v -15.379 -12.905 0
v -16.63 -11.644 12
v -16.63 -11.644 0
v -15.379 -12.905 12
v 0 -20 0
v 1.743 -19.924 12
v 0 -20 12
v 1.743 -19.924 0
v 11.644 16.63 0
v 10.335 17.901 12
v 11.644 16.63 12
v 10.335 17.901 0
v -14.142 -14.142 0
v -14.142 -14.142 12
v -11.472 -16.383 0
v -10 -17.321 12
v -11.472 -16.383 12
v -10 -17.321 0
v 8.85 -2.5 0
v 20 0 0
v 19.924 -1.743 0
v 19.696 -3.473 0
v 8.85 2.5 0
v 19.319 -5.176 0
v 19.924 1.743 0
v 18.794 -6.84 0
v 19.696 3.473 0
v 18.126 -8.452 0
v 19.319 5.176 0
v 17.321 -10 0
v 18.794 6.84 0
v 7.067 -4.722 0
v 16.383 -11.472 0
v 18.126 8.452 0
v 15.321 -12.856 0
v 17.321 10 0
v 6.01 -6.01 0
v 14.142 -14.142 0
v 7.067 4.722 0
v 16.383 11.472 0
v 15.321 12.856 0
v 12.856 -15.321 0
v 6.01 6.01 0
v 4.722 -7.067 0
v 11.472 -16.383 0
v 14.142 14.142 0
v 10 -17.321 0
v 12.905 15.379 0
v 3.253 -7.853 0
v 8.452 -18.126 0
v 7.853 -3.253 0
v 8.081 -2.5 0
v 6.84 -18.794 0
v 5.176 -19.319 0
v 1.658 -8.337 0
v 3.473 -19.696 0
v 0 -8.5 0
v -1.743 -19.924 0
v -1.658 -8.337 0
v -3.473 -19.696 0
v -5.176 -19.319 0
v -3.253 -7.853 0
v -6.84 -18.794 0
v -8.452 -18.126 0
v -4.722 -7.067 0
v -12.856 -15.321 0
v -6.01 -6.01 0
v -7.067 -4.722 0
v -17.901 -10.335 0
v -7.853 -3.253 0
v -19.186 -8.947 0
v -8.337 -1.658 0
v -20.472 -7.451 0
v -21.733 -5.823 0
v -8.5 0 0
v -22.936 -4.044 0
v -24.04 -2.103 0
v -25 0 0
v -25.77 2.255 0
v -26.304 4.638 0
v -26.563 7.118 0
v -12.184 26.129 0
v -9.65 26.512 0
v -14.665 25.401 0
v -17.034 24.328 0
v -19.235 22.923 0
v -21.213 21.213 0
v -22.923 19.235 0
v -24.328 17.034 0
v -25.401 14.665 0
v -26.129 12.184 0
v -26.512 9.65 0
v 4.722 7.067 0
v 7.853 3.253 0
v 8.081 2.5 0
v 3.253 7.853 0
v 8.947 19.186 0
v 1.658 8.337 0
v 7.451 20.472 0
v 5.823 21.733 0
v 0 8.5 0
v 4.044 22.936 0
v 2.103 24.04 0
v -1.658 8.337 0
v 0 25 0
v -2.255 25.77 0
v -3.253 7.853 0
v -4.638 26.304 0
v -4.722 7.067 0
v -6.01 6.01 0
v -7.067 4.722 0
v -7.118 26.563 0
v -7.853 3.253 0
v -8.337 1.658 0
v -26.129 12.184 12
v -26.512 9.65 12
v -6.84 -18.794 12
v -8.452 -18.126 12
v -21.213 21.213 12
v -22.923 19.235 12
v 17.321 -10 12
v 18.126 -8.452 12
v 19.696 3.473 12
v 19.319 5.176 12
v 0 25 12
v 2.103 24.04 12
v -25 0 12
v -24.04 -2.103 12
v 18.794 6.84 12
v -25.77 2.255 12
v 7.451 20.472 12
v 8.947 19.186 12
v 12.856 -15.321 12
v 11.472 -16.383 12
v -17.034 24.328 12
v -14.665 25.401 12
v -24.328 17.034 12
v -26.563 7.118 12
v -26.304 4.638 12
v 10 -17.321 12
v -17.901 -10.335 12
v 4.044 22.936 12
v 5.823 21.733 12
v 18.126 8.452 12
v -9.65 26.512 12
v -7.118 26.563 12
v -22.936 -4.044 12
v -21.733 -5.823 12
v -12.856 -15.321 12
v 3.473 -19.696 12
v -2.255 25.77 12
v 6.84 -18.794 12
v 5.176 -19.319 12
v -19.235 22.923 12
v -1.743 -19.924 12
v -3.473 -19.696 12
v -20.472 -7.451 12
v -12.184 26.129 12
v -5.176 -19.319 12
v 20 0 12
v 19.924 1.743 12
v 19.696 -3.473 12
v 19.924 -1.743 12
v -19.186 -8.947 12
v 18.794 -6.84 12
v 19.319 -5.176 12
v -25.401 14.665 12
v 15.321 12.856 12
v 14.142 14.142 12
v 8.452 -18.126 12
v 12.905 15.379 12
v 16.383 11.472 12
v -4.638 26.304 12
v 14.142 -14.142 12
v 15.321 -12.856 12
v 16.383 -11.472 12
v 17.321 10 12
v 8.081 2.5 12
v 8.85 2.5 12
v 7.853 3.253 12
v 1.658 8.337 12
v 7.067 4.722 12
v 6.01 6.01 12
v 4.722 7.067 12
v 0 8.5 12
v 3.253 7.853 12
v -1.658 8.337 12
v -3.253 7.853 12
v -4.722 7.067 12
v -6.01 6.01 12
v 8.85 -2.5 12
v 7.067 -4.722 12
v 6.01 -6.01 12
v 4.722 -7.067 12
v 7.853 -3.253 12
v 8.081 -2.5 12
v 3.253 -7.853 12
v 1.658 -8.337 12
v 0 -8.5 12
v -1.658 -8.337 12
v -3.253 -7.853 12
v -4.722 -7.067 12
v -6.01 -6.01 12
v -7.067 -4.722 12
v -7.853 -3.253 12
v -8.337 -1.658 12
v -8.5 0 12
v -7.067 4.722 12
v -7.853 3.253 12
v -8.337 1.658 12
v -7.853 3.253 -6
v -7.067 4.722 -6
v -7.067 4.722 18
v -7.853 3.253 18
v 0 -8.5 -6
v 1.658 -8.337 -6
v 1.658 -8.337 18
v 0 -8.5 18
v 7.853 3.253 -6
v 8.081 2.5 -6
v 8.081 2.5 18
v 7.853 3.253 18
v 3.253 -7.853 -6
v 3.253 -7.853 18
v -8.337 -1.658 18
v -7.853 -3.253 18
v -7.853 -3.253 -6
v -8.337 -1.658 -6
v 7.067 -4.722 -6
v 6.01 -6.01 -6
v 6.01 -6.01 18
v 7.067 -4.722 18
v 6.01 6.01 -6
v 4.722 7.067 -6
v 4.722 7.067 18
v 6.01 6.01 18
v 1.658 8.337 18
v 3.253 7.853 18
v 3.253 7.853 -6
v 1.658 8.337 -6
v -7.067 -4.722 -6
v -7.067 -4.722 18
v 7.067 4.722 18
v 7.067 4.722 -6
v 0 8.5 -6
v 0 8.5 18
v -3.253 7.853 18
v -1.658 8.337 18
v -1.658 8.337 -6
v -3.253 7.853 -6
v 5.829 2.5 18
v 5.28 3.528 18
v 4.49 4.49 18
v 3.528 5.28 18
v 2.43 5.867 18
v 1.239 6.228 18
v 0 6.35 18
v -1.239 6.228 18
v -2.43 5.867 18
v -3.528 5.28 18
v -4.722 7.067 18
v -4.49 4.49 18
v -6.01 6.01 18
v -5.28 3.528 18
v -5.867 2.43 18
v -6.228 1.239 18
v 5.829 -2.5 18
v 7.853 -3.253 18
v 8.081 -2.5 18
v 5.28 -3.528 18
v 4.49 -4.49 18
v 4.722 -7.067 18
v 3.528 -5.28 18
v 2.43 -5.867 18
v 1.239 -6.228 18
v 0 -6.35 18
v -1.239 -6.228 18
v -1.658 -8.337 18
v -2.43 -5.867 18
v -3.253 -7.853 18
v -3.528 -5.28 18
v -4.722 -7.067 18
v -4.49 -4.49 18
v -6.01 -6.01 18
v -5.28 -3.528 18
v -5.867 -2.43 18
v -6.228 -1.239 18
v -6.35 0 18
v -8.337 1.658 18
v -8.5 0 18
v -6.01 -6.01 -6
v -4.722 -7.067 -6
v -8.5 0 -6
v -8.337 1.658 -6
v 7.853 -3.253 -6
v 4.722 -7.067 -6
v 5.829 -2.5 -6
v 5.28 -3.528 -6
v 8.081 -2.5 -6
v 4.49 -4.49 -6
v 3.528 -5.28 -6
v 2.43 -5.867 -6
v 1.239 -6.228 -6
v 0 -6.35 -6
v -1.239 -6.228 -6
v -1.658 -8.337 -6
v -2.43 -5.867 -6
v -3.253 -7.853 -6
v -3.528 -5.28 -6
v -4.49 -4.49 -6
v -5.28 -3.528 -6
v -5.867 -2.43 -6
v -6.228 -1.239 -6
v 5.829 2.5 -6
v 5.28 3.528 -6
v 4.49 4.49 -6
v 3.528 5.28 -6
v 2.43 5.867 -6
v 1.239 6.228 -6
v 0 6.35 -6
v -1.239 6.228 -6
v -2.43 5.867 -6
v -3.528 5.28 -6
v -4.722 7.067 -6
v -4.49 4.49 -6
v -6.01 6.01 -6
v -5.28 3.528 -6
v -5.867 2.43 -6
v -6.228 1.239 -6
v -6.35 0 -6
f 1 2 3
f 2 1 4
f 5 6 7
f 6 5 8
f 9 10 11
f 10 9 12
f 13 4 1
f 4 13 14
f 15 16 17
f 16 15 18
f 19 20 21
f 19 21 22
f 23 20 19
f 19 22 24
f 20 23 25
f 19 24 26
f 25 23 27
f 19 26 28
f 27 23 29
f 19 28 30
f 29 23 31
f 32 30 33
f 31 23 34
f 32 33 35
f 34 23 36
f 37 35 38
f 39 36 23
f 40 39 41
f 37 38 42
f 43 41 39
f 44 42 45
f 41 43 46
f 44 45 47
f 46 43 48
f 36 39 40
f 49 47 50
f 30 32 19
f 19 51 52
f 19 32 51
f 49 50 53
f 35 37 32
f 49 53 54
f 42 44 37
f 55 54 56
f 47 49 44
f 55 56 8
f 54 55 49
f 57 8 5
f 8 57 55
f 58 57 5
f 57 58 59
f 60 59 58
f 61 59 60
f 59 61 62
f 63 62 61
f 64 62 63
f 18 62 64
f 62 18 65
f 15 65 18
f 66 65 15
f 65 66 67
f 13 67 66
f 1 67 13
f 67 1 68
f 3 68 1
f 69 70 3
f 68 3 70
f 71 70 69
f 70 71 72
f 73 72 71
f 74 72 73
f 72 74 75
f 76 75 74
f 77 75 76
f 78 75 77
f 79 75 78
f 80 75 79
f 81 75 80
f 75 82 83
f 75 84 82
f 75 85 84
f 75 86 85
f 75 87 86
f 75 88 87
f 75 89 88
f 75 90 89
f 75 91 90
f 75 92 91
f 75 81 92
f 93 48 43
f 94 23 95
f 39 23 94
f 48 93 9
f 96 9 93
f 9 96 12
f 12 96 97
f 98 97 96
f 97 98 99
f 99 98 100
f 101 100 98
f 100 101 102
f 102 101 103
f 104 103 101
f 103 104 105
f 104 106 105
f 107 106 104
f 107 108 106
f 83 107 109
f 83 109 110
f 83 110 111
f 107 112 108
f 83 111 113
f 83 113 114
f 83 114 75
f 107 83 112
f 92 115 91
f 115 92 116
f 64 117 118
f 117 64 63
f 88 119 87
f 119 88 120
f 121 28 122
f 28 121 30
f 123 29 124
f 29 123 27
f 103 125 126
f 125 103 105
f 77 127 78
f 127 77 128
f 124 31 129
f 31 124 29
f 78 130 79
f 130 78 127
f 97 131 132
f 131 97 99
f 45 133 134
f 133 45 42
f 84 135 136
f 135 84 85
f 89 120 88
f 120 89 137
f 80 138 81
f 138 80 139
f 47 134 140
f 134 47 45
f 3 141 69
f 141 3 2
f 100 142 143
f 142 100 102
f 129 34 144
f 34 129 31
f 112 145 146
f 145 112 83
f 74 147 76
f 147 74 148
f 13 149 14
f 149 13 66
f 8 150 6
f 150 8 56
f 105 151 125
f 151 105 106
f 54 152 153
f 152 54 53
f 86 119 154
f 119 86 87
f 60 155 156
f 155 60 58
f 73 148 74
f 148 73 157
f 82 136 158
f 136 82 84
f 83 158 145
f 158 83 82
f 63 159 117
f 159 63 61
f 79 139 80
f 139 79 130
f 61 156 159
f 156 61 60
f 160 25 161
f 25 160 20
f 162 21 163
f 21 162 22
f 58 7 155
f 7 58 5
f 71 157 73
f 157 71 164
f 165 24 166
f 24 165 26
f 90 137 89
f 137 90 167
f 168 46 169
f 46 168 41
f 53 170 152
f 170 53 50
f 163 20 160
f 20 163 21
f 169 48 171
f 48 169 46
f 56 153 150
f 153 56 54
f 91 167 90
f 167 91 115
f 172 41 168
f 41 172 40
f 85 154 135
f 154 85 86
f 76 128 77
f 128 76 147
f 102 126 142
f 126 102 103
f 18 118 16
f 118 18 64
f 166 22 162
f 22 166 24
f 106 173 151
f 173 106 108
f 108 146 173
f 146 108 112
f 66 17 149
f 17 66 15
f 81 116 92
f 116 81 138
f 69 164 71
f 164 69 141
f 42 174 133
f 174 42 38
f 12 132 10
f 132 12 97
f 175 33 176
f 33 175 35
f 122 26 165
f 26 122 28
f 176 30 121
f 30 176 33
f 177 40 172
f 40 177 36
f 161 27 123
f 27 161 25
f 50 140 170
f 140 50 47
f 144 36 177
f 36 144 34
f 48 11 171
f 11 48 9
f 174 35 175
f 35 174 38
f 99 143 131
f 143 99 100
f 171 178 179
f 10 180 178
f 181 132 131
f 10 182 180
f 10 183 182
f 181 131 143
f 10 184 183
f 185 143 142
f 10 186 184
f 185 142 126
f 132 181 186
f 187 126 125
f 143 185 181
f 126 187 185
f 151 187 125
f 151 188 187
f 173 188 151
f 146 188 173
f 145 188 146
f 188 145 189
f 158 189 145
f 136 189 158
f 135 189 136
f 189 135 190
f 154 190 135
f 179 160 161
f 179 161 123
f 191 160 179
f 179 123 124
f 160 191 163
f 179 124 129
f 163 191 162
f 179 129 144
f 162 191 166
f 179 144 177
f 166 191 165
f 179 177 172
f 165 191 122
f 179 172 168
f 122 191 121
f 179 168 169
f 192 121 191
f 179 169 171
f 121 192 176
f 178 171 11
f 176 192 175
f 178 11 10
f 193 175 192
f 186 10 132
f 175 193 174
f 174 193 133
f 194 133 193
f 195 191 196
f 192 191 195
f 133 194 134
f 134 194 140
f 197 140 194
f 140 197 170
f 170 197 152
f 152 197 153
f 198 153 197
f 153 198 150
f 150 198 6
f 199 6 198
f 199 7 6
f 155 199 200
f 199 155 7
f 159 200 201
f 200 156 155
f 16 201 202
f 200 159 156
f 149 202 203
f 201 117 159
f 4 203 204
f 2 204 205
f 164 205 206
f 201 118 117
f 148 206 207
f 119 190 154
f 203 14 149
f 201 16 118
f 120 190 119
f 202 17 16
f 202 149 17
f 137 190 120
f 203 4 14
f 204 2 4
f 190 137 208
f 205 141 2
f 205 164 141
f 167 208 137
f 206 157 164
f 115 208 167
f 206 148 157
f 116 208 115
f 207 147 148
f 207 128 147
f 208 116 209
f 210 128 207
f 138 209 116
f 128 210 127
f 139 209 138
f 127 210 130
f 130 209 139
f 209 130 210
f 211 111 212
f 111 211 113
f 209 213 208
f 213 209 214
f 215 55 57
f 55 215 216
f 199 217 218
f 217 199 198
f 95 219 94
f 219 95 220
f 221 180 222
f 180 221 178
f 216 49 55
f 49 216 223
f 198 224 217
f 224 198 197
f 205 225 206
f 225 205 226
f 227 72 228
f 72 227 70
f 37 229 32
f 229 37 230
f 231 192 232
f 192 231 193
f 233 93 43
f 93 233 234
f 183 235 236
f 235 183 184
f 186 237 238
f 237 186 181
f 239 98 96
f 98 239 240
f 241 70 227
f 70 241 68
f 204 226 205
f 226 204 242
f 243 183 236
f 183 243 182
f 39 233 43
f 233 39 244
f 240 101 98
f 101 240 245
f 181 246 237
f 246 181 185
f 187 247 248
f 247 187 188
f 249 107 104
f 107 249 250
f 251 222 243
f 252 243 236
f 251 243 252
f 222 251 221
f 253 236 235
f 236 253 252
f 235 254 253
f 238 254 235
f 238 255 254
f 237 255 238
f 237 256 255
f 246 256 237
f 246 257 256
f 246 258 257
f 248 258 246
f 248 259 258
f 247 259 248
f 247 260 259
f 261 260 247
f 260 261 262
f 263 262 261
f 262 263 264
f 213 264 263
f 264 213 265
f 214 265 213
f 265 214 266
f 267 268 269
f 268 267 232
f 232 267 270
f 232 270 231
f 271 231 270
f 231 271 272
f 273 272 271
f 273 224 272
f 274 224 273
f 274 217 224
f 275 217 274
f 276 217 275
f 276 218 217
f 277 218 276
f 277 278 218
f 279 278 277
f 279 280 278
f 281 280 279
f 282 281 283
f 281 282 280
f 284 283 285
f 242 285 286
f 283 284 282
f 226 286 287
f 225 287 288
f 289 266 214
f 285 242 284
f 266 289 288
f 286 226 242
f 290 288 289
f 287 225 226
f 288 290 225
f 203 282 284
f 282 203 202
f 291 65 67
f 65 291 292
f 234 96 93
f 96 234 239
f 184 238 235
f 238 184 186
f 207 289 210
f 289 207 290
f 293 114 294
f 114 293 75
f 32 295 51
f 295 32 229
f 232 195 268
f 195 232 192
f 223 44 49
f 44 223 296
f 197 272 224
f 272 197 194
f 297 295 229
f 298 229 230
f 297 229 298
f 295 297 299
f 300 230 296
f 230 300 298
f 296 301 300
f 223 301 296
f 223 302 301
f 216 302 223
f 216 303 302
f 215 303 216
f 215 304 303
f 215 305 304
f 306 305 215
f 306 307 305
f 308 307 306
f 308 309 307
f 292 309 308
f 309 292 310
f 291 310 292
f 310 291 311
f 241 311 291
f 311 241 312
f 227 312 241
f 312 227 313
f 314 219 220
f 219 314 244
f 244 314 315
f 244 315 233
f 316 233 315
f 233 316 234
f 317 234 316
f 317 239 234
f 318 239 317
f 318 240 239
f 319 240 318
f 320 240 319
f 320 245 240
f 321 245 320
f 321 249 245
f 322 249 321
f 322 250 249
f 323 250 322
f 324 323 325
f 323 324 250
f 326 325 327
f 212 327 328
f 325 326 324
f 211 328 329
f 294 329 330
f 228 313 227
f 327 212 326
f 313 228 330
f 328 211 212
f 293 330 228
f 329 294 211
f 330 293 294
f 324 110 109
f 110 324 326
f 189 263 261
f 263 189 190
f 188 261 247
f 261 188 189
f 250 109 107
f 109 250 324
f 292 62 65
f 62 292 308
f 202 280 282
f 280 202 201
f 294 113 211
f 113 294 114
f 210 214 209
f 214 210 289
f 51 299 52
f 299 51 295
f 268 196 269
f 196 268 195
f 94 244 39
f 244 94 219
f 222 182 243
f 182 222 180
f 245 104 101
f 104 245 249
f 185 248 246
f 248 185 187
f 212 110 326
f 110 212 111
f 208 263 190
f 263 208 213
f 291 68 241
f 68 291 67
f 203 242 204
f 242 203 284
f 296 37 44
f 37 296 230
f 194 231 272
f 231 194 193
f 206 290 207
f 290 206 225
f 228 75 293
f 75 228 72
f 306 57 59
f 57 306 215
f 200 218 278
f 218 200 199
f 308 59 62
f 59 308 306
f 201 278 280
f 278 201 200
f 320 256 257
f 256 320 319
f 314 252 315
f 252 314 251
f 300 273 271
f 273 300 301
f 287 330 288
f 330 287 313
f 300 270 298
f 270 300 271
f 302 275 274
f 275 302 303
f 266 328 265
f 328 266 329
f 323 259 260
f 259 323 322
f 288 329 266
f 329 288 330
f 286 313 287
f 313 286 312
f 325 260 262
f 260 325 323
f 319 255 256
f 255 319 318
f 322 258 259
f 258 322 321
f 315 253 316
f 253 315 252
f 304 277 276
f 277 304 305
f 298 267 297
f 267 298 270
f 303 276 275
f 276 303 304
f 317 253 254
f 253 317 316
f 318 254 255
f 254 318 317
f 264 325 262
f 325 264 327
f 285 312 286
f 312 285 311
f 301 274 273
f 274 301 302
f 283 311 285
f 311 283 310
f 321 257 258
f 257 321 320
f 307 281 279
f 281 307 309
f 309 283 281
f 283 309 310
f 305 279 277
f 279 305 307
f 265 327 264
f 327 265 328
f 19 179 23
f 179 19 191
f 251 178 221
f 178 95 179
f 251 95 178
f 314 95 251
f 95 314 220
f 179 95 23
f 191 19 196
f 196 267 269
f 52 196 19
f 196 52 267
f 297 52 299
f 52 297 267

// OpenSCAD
$fn = 32;

// ----------------------------------------------------------------------
// Cam: base radius 20 mm with a 10 mm lift over 180 degrees
// ----------------------------------------------------------------------

// --- parameters (mm) ---
base_r = 20;              // base radius
lift = 10;                // lift height above the base radius
lift_span = 180;          // angular width of the lift
lift_start = 45;          // angle where the lift starts
cam_t = 12;               // cam plate thickness
hub_d = 17;               // hub diameter
hub_h = 24;               // hub height
bore_d = 12.7;            // bore
key_w = 5;                // keyway width
key_depth = 1.6;          // keyway depth

cam_profile = [[20, 0], [19.924, 1.743], [19.696, 3.473], [19.319, 5.176], [18.794, 6.84], [18.126, 8.452], [17.321, 10], [16.383, 11.472], [15.321, 12.856], [14.142, 14.142], [12.905, 15.379], [11.644, 16.63], [10.335, 17.901], [8.947, 19.186], [7.451, 20.472], [5.823, 21.733], [4.044, 22.936], [2.103, 24.04], [0, 25], [-2.255, 25.77], [-4.638, 26.304], [-7.118, 26.563], [-9.65, 26.512], [-12.184, 26.129], [-14.665, 25.401], [-17.034, 24.328], [-19.235, 22.923], [-21.213, 21.213], [-22.923, 19.235], [-24.328, 17.034], [-25.401, 14.665], [-26.129, 12.184], [-26.512, 9.65], [-26.563, 7.118], [-26.304, 4.638], [-25.77, 2.255], [-25, 0], [-24.04, -2.103], [-22.936, -4.044], [-21.733, -5.823], [-20.472, -7.451], [-19.186, -8.947], [-17.901, -10.335], [-16.63, -11.644], [-15.379, -12.905], [-14.142, -14.142], [-12.856, -15.321], [-11.472, -16.383], [-10, -17.321], [-8.452, -18.126], [-6.84, -18.794], [-5.176, -19.319], [-3.473, -19.696], [-1.743, -19.924], [0, -20], [1.743, -19.924], [3.473, -19.696], [5.176, -19.319], [6.84, -18.794], [8.452, -18.126], [10, -17.321], [11.472, -16.383], [12.856, -15.321], [14.142, -14.142], [15.321, -12.856], [16.383, -11.472], [17.321, -10], [18.126, -8.452], [18.794, -6.84], [19.319, -5.176], [19.696, -3.473], [19.924, -1.743]];

difference() {
  union() {
    linear_extrude(height = cam_t) polygon(cam_profile);
    /* hub, proud of the cam plate on both sides */
    translate([0, 0, -6]) cylinder(h = hub_h, d = hub_d);
  }
  /* bore through the hub, 2.5 mm clear on both faces */
  translate([0, 0, -8.5]) cylinder(h = hub_h + 5, d = bore_d);
  /* keyway, milled through the whole hub */
  translate([4.75, -2.5, -8.5]) cube([4.1, 5, 29]);
}
